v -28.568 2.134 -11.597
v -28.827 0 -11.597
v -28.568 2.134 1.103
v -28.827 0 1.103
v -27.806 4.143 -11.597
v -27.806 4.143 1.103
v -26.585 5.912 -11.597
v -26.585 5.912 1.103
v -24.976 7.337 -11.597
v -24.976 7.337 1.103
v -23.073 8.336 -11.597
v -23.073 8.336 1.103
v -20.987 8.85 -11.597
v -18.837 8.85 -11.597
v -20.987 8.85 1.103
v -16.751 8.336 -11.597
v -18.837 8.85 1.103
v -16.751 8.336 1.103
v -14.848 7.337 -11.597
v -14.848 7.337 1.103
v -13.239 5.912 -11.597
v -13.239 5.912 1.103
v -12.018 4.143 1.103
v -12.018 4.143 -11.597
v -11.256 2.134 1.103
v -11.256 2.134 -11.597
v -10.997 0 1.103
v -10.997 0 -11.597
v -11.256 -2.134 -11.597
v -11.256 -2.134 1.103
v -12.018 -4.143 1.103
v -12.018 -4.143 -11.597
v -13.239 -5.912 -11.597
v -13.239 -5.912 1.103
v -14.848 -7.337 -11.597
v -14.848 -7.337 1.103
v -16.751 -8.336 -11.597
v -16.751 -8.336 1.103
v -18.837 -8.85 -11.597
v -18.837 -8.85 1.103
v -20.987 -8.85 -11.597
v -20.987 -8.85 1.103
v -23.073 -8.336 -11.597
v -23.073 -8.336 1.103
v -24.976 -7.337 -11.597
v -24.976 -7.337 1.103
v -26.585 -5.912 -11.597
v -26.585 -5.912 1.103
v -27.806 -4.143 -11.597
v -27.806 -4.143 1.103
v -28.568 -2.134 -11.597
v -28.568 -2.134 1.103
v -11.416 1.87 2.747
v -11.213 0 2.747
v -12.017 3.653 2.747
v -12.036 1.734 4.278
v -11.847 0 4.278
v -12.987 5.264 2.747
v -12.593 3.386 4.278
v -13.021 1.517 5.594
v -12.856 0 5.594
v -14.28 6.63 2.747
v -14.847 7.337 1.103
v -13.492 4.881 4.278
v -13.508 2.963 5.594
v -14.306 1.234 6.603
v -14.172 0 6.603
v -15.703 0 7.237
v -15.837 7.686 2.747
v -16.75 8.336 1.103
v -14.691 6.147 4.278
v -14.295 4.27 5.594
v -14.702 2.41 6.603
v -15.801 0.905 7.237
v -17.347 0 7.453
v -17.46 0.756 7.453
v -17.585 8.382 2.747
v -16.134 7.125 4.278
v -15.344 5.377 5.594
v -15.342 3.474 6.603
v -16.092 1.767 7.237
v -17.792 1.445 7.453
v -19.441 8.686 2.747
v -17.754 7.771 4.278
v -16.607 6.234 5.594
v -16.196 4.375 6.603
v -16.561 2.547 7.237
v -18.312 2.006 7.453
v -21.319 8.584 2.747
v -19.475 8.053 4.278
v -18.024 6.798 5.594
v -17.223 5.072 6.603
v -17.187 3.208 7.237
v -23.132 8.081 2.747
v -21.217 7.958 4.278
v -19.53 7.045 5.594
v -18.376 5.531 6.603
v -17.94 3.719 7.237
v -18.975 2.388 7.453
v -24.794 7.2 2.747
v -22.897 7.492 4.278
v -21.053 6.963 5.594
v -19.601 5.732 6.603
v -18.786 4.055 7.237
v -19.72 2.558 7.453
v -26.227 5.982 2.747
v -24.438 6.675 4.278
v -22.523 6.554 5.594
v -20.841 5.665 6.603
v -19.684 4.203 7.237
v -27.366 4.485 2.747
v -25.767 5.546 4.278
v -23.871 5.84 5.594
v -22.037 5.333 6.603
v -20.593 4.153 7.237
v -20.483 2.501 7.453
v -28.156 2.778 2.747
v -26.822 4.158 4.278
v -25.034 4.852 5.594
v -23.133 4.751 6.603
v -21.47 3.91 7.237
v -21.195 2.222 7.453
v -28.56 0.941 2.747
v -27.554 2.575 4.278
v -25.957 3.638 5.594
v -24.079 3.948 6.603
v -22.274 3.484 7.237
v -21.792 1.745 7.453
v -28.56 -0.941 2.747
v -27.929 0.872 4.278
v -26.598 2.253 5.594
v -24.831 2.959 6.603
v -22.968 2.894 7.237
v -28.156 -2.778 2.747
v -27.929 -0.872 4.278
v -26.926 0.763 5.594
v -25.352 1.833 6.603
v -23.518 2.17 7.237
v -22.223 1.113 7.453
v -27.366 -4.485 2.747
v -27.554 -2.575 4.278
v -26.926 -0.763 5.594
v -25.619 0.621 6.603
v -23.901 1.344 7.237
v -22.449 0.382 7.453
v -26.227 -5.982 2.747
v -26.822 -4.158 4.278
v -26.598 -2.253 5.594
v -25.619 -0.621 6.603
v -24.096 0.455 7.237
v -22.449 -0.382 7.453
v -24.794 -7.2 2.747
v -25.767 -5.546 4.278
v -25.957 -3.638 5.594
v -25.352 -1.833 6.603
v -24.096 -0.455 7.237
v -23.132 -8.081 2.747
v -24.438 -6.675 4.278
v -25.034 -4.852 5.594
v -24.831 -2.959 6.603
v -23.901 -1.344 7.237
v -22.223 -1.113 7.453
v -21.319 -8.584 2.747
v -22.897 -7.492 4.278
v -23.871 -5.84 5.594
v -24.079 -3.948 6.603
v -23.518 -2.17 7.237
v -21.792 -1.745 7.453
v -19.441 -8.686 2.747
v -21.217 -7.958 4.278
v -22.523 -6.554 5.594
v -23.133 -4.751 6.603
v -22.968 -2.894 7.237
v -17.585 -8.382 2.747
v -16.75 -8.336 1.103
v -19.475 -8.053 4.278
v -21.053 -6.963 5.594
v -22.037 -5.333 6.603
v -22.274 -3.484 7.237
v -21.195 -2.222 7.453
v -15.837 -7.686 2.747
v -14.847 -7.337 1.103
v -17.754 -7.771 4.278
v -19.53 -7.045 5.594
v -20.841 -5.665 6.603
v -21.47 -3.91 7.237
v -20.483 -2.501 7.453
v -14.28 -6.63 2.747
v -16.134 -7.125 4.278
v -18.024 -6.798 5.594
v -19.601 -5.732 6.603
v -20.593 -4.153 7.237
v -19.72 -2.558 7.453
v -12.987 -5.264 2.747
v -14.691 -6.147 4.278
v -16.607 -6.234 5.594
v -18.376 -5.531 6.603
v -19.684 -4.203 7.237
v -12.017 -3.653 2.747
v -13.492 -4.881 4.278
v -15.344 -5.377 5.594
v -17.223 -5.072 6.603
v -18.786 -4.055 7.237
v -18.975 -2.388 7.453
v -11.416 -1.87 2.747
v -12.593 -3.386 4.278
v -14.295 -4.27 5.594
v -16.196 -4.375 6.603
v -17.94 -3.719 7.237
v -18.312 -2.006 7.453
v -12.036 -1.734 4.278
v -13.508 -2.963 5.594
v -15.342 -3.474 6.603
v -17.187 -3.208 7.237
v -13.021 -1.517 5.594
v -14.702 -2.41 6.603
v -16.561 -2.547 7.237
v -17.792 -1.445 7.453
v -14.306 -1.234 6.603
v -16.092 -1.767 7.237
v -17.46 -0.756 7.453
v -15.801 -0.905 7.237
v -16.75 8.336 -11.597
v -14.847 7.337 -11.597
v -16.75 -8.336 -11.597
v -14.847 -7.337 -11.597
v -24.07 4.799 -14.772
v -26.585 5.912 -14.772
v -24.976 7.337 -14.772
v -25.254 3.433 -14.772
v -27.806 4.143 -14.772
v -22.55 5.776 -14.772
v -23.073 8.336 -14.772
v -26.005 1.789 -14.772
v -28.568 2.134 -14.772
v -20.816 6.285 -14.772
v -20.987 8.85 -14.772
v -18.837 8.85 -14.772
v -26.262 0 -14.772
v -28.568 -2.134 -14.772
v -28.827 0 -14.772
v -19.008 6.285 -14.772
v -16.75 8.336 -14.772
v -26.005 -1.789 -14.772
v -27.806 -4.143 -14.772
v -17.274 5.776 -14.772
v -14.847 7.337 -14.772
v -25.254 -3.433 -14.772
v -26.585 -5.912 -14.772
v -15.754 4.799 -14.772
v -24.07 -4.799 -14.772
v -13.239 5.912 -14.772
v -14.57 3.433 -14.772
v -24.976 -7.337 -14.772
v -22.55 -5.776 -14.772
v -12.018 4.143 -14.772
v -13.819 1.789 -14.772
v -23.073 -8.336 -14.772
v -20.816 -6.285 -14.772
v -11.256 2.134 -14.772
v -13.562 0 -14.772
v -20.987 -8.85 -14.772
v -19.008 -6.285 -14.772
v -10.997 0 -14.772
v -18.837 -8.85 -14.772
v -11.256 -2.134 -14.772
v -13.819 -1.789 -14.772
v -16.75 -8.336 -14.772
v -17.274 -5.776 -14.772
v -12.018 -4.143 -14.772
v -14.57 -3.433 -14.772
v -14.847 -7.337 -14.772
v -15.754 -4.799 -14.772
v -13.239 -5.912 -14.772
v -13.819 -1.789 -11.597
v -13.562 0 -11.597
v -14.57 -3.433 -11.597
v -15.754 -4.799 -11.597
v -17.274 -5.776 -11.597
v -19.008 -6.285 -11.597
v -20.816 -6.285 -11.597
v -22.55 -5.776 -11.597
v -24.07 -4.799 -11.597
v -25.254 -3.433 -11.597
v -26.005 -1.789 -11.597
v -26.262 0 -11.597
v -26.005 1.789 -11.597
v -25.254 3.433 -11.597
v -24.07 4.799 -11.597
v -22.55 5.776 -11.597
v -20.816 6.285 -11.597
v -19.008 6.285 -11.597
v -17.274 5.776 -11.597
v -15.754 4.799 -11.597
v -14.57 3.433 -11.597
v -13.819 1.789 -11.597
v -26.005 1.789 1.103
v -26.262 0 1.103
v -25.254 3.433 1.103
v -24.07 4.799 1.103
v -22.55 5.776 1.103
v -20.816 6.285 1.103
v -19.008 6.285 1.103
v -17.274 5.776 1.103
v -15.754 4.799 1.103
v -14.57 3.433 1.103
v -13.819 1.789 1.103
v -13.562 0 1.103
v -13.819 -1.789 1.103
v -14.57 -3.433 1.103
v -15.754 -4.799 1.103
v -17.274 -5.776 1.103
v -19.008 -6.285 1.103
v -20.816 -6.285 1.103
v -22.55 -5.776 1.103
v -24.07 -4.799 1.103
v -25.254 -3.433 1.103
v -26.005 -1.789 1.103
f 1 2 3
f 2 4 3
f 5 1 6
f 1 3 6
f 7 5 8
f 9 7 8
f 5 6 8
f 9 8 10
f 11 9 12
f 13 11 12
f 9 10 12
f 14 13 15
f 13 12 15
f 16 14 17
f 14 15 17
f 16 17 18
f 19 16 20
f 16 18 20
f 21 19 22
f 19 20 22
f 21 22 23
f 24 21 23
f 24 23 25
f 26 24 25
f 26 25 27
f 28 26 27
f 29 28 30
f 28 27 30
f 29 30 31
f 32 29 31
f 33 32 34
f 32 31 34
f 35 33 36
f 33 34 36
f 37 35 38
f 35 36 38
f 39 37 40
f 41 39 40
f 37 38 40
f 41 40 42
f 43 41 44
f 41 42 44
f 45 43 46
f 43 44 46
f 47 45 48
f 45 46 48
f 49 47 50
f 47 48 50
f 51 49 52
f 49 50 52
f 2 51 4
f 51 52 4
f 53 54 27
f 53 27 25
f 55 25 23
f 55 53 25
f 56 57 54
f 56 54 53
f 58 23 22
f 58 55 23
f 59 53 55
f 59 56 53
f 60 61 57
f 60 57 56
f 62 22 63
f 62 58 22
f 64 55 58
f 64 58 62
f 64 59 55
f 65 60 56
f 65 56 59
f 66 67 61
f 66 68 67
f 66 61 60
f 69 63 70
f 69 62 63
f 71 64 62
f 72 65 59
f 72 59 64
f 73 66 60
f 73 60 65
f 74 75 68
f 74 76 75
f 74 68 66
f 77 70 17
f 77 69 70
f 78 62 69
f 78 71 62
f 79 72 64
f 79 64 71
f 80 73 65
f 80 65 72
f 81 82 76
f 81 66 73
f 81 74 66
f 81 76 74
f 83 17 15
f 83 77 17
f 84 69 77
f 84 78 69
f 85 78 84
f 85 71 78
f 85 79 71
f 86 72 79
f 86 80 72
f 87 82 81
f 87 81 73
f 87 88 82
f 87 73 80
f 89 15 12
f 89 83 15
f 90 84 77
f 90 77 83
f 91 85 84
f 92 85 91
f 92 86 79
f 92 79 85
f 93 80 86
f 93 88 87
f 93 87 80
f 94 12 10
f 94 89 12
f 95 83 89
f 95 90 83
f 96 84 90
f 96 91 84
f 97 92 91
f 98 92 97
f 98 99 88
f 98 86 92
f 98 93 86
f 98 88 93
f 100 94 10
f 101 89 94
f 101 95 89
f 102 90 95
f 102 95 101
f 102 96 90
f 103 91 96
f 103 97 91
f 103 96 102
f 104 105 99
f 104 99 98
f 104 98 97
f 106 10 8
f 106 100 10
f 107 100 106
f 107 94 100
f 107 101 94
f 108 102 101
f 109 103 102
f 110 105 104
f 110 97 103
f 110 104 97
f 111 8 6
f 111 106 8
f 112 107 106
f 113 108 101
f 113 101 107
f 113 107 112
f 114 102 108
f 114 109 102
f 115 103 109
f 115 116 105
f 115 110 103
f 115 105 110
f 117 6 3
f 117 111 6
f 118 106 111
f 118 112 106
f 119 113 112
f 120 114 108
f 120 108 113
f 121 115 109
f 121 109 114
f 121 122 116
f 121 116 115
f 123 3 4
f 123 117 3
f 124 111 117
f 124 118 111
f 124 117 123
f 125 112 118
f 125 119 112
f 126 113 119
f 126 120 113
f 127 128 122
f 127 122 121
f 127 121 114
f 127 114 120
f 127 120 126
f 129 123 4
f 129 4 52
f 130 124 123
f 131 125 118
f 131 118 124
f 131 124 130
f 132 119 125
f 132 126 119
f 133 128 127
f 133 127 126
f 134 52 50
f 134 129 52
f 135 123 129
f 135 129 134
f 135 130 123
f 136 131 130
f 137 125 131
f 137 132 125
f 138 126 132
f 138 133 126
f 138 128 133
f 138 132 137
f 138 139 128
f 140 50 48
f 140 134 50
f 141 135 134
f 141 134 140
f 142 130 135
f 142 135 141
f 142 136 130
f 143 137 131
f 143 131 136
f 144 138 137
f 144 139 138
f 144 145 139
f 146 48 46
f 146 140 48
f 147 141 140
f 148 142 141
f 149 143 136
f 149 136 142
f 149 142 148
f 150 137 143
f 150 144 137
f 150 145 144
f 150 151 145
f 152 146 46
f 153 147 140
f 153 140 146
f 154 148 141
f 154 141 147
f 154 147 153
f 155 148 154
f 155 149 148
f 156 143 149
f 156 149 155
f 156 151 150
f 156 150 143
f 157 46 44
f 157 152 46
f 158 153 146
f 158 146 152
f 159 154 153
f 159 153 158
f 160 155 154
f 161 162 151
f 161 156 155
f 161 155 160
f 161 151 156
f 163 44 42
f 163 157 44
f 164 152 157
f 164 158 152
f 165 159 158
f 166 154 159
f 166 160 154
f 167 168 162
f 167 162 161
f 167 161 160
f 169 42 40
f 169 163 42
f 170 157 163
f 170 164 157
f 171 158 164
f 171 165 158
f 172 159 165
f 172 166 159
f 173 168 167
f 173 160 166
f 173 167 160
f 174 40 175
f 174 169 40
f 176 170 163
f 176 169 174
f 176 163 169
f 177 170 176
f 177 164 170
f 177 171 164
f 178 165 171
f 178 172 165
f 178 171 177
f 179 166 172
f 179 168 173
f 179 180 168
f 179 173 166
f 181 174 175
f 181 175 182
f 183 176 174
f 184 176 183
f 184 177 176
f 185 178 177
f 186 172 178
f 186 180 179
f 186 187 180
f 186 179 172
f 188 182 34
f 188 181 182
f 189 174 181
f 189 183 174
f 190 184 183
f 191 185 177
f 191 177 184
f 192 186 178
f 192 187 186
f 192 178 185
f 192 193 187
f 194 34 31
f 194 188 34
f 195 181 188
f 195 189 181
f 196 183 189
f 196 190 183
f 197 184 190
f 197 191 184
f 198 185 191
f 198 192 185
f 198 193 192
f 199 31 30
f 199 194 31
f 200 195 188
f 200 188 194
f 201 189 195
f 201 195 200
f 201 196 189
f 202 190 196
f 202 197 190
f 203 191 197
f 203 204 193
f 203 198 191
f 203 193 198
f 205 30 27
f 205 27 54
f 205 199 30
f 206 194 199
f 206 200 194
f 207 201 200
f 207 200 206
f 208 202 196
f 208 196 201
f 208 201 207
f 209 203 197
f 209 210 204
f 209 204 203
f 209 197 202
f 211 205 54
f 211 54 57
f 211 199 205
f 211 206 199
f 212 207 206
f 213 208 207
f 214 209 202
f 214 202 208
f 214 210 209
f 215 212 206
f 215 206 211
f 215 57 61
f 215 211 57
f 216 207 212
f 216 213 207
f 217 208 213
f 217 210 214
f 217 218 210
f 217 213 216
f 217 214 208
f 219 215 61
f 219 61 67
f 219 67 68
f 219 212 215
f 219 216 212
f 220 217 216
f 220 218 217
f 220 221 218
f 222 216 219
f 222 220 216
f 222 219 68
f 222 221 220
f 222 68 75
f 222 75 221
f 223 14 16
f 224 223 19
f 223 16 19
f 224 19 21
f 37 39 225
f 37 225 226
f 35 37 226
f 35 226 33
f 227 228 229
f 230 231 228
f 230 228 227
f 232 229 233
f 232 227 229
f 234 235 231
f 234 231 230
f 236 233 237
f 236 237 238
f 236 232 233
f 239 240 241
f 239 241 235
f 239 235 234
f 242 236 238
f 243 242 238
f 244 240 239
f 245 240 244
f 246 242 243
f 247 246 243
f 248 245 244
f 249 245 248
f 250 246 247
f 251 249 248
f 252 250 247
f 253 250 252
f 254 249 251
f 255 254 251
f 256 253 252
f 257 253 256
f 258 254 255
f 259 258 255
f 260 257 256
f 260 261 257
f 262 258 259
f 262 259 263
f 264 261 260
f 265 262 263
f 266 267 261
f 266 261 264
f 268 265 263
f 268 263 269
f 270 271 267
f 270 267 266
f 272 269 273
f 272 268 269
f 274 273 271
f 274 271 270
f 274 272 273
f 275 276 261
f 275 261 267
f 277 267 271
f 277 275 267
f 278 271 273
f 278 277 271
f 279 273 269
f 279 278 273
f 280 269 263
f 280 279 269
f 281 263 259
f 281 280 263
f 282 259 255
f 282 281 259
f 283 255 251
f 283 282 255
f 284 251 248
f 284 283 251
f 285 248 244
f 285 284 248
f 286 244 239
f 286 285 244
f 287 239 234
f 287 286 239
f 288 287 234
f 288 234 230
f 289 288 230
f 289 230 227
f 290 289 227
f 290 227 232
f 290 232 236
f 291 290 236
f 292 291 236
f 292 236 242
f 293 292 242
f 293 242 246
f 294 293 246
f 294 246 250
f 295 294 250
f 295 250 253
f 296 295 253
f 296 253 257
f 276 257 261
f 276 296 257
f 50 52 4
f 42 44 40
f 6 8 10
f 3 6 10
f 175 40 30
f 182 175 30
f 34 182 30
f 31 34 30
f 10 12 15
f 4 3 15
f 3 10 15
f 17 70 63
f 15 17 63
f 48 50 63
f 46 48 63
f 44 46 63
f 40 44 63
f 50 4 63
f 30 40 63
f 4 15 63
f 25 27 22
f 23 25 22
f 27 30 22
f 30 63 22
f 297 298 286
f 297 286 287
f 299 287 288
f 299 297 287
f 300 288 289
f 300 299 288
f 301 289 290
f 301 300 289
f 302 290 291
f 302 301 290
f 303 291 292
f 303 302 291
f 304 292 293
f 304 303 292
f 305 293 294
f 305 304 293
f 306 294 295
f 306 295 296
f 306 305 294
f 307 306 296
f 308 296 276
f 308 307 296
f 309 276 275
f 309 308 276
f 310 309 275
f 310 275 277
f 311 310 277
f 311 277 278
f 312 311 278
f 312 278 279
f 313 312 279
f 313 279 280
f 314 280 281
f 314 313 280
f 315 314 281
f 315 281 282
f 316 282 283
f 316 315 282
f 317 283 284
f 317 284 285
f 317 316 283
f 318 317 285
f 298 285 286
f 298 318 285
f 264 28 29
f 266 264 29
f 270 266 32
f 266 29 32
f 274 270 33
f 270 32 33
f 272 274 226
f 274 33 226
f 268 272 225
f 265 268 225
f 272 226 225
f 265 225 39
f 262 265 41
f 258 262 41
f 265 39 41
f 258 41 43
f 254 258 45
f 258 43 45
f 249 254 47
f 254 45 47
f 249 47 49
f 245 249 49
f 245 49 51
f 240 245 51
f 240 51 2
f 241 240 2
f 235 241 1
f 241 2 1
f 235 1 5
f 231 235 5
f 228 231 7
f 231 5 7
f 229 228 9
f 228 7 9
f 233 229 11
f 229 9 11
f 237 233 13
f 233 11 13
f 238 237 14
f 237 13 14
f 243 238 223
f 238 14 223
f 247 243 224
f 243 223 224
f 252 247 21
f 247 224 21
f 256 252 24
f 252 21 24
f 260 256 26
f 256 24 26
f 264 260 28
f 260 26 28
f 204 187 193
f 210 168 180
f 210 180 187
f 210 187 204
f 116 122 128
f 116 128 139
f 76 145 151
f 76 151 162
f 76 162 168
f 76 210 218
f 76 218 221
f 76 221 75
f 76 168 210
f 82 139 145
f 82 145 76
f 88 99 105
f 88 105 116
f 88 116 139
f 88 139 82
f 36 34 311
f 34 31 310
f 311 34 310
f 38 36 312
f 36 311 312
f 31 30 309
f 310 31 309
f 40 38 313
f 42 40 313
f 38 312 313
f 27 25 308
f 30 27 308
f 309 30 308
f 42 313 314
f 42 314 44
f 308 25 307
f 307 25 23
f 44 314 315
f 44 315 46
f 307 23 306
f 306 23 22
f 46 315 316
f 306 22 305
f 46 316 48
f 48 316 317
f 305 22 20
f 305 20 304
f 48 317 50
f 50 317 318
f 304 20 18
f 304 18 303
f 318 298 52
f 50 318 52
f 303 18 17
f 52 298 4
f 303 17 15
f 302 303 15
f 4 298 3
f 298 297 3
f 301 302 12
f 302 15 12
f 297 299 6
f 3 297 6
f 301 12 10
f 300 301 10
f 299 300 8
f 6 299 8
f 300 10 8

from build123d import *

# Parameters (mm, degrees)
F0_W     = 2.5650248432
F0_H     = 12.7
F2_R     = 8.9154
F2_R_2   = 8.9150248432
F2_R_3   = 6.35
F3_DEPTH = 6.35
F4_R     = 6.34999
F5_R     = 8.9154
F5_R_2   = 8.9150248432
F5_R_3   = 6.35
F6_DEPTH = 3.175


# Not quite as in the source:
# - a fillet or chamfer is up to 0.001 mm smaller than in the source, because OpenCascade refuses the exact size


with BuildPart() as f1:
    # F0 (on Front) → F1 (revolve)
    with BuildSketch(Plane.XZ):
        with Locations((-27.5444276631, -5.2465572953)):
            Rectangle(F0_W, F0_H)
    revolve(axis=Axis((-19.9119152415, 0, -5.2465572953), (0, 0, -1)))

    # F5 (on face) → F6 (join)
    with BuildSketch(Plane(origin=(0, 0, -11.5965572953), x_dir=(1, 0, 0), z_dir=(0, 0, -1))):
        with Locations((-19.9119152415, 0)):
            Circle(F5_R)
        with Locations((-19.9119152415, 0)):
            Circle(F5_R_2, mode=Mode.SUBTRACT)
        with Locations((-19.9119152415, 0)):
            Circle(F5_R_2)
        with Locations((-19.9119152415, 0)):
            Circle(F5_R_3, mode=Mode.SUBTRACT)
    extrude(amount=F6_DEPTH)


with BuildPart() as f3:
    # F2 (on face) → F3 (new body)
    with BuildSketch(Plane.XY.offset(1.1034427047)):
        with Locations((-19.9119152415, 0)):
            Circle(F2_R)
        with Locations((-19.9119152415, 0)):
            Circle(F2_R_2, mode=Mode.SUBTRACT)
        with Locations((-19.9119152415, 0)):
            Circle(F2_R_2)
        with Locations((-19.9119152415, 0)):
            Circle(F2_R_3, mode=Mode.SUBTRACT)
        with Locations((-19.9119152415, 0)):
            Circle(F2_R_3)
    extrude(amount=F3_DEPTH)

    # F4 (radius 6.35 in the source; OpenCascade refuses exactly that, so slightly less here)
    f4_edges = [f3.edges().sort_by_distance(p)[0] for p in [
        (-28.827315, 0, 7.453443),
    ]]
    fillet(f4_edges, radius=F4_R)


solid = Compound([f1.part, f3.part])
